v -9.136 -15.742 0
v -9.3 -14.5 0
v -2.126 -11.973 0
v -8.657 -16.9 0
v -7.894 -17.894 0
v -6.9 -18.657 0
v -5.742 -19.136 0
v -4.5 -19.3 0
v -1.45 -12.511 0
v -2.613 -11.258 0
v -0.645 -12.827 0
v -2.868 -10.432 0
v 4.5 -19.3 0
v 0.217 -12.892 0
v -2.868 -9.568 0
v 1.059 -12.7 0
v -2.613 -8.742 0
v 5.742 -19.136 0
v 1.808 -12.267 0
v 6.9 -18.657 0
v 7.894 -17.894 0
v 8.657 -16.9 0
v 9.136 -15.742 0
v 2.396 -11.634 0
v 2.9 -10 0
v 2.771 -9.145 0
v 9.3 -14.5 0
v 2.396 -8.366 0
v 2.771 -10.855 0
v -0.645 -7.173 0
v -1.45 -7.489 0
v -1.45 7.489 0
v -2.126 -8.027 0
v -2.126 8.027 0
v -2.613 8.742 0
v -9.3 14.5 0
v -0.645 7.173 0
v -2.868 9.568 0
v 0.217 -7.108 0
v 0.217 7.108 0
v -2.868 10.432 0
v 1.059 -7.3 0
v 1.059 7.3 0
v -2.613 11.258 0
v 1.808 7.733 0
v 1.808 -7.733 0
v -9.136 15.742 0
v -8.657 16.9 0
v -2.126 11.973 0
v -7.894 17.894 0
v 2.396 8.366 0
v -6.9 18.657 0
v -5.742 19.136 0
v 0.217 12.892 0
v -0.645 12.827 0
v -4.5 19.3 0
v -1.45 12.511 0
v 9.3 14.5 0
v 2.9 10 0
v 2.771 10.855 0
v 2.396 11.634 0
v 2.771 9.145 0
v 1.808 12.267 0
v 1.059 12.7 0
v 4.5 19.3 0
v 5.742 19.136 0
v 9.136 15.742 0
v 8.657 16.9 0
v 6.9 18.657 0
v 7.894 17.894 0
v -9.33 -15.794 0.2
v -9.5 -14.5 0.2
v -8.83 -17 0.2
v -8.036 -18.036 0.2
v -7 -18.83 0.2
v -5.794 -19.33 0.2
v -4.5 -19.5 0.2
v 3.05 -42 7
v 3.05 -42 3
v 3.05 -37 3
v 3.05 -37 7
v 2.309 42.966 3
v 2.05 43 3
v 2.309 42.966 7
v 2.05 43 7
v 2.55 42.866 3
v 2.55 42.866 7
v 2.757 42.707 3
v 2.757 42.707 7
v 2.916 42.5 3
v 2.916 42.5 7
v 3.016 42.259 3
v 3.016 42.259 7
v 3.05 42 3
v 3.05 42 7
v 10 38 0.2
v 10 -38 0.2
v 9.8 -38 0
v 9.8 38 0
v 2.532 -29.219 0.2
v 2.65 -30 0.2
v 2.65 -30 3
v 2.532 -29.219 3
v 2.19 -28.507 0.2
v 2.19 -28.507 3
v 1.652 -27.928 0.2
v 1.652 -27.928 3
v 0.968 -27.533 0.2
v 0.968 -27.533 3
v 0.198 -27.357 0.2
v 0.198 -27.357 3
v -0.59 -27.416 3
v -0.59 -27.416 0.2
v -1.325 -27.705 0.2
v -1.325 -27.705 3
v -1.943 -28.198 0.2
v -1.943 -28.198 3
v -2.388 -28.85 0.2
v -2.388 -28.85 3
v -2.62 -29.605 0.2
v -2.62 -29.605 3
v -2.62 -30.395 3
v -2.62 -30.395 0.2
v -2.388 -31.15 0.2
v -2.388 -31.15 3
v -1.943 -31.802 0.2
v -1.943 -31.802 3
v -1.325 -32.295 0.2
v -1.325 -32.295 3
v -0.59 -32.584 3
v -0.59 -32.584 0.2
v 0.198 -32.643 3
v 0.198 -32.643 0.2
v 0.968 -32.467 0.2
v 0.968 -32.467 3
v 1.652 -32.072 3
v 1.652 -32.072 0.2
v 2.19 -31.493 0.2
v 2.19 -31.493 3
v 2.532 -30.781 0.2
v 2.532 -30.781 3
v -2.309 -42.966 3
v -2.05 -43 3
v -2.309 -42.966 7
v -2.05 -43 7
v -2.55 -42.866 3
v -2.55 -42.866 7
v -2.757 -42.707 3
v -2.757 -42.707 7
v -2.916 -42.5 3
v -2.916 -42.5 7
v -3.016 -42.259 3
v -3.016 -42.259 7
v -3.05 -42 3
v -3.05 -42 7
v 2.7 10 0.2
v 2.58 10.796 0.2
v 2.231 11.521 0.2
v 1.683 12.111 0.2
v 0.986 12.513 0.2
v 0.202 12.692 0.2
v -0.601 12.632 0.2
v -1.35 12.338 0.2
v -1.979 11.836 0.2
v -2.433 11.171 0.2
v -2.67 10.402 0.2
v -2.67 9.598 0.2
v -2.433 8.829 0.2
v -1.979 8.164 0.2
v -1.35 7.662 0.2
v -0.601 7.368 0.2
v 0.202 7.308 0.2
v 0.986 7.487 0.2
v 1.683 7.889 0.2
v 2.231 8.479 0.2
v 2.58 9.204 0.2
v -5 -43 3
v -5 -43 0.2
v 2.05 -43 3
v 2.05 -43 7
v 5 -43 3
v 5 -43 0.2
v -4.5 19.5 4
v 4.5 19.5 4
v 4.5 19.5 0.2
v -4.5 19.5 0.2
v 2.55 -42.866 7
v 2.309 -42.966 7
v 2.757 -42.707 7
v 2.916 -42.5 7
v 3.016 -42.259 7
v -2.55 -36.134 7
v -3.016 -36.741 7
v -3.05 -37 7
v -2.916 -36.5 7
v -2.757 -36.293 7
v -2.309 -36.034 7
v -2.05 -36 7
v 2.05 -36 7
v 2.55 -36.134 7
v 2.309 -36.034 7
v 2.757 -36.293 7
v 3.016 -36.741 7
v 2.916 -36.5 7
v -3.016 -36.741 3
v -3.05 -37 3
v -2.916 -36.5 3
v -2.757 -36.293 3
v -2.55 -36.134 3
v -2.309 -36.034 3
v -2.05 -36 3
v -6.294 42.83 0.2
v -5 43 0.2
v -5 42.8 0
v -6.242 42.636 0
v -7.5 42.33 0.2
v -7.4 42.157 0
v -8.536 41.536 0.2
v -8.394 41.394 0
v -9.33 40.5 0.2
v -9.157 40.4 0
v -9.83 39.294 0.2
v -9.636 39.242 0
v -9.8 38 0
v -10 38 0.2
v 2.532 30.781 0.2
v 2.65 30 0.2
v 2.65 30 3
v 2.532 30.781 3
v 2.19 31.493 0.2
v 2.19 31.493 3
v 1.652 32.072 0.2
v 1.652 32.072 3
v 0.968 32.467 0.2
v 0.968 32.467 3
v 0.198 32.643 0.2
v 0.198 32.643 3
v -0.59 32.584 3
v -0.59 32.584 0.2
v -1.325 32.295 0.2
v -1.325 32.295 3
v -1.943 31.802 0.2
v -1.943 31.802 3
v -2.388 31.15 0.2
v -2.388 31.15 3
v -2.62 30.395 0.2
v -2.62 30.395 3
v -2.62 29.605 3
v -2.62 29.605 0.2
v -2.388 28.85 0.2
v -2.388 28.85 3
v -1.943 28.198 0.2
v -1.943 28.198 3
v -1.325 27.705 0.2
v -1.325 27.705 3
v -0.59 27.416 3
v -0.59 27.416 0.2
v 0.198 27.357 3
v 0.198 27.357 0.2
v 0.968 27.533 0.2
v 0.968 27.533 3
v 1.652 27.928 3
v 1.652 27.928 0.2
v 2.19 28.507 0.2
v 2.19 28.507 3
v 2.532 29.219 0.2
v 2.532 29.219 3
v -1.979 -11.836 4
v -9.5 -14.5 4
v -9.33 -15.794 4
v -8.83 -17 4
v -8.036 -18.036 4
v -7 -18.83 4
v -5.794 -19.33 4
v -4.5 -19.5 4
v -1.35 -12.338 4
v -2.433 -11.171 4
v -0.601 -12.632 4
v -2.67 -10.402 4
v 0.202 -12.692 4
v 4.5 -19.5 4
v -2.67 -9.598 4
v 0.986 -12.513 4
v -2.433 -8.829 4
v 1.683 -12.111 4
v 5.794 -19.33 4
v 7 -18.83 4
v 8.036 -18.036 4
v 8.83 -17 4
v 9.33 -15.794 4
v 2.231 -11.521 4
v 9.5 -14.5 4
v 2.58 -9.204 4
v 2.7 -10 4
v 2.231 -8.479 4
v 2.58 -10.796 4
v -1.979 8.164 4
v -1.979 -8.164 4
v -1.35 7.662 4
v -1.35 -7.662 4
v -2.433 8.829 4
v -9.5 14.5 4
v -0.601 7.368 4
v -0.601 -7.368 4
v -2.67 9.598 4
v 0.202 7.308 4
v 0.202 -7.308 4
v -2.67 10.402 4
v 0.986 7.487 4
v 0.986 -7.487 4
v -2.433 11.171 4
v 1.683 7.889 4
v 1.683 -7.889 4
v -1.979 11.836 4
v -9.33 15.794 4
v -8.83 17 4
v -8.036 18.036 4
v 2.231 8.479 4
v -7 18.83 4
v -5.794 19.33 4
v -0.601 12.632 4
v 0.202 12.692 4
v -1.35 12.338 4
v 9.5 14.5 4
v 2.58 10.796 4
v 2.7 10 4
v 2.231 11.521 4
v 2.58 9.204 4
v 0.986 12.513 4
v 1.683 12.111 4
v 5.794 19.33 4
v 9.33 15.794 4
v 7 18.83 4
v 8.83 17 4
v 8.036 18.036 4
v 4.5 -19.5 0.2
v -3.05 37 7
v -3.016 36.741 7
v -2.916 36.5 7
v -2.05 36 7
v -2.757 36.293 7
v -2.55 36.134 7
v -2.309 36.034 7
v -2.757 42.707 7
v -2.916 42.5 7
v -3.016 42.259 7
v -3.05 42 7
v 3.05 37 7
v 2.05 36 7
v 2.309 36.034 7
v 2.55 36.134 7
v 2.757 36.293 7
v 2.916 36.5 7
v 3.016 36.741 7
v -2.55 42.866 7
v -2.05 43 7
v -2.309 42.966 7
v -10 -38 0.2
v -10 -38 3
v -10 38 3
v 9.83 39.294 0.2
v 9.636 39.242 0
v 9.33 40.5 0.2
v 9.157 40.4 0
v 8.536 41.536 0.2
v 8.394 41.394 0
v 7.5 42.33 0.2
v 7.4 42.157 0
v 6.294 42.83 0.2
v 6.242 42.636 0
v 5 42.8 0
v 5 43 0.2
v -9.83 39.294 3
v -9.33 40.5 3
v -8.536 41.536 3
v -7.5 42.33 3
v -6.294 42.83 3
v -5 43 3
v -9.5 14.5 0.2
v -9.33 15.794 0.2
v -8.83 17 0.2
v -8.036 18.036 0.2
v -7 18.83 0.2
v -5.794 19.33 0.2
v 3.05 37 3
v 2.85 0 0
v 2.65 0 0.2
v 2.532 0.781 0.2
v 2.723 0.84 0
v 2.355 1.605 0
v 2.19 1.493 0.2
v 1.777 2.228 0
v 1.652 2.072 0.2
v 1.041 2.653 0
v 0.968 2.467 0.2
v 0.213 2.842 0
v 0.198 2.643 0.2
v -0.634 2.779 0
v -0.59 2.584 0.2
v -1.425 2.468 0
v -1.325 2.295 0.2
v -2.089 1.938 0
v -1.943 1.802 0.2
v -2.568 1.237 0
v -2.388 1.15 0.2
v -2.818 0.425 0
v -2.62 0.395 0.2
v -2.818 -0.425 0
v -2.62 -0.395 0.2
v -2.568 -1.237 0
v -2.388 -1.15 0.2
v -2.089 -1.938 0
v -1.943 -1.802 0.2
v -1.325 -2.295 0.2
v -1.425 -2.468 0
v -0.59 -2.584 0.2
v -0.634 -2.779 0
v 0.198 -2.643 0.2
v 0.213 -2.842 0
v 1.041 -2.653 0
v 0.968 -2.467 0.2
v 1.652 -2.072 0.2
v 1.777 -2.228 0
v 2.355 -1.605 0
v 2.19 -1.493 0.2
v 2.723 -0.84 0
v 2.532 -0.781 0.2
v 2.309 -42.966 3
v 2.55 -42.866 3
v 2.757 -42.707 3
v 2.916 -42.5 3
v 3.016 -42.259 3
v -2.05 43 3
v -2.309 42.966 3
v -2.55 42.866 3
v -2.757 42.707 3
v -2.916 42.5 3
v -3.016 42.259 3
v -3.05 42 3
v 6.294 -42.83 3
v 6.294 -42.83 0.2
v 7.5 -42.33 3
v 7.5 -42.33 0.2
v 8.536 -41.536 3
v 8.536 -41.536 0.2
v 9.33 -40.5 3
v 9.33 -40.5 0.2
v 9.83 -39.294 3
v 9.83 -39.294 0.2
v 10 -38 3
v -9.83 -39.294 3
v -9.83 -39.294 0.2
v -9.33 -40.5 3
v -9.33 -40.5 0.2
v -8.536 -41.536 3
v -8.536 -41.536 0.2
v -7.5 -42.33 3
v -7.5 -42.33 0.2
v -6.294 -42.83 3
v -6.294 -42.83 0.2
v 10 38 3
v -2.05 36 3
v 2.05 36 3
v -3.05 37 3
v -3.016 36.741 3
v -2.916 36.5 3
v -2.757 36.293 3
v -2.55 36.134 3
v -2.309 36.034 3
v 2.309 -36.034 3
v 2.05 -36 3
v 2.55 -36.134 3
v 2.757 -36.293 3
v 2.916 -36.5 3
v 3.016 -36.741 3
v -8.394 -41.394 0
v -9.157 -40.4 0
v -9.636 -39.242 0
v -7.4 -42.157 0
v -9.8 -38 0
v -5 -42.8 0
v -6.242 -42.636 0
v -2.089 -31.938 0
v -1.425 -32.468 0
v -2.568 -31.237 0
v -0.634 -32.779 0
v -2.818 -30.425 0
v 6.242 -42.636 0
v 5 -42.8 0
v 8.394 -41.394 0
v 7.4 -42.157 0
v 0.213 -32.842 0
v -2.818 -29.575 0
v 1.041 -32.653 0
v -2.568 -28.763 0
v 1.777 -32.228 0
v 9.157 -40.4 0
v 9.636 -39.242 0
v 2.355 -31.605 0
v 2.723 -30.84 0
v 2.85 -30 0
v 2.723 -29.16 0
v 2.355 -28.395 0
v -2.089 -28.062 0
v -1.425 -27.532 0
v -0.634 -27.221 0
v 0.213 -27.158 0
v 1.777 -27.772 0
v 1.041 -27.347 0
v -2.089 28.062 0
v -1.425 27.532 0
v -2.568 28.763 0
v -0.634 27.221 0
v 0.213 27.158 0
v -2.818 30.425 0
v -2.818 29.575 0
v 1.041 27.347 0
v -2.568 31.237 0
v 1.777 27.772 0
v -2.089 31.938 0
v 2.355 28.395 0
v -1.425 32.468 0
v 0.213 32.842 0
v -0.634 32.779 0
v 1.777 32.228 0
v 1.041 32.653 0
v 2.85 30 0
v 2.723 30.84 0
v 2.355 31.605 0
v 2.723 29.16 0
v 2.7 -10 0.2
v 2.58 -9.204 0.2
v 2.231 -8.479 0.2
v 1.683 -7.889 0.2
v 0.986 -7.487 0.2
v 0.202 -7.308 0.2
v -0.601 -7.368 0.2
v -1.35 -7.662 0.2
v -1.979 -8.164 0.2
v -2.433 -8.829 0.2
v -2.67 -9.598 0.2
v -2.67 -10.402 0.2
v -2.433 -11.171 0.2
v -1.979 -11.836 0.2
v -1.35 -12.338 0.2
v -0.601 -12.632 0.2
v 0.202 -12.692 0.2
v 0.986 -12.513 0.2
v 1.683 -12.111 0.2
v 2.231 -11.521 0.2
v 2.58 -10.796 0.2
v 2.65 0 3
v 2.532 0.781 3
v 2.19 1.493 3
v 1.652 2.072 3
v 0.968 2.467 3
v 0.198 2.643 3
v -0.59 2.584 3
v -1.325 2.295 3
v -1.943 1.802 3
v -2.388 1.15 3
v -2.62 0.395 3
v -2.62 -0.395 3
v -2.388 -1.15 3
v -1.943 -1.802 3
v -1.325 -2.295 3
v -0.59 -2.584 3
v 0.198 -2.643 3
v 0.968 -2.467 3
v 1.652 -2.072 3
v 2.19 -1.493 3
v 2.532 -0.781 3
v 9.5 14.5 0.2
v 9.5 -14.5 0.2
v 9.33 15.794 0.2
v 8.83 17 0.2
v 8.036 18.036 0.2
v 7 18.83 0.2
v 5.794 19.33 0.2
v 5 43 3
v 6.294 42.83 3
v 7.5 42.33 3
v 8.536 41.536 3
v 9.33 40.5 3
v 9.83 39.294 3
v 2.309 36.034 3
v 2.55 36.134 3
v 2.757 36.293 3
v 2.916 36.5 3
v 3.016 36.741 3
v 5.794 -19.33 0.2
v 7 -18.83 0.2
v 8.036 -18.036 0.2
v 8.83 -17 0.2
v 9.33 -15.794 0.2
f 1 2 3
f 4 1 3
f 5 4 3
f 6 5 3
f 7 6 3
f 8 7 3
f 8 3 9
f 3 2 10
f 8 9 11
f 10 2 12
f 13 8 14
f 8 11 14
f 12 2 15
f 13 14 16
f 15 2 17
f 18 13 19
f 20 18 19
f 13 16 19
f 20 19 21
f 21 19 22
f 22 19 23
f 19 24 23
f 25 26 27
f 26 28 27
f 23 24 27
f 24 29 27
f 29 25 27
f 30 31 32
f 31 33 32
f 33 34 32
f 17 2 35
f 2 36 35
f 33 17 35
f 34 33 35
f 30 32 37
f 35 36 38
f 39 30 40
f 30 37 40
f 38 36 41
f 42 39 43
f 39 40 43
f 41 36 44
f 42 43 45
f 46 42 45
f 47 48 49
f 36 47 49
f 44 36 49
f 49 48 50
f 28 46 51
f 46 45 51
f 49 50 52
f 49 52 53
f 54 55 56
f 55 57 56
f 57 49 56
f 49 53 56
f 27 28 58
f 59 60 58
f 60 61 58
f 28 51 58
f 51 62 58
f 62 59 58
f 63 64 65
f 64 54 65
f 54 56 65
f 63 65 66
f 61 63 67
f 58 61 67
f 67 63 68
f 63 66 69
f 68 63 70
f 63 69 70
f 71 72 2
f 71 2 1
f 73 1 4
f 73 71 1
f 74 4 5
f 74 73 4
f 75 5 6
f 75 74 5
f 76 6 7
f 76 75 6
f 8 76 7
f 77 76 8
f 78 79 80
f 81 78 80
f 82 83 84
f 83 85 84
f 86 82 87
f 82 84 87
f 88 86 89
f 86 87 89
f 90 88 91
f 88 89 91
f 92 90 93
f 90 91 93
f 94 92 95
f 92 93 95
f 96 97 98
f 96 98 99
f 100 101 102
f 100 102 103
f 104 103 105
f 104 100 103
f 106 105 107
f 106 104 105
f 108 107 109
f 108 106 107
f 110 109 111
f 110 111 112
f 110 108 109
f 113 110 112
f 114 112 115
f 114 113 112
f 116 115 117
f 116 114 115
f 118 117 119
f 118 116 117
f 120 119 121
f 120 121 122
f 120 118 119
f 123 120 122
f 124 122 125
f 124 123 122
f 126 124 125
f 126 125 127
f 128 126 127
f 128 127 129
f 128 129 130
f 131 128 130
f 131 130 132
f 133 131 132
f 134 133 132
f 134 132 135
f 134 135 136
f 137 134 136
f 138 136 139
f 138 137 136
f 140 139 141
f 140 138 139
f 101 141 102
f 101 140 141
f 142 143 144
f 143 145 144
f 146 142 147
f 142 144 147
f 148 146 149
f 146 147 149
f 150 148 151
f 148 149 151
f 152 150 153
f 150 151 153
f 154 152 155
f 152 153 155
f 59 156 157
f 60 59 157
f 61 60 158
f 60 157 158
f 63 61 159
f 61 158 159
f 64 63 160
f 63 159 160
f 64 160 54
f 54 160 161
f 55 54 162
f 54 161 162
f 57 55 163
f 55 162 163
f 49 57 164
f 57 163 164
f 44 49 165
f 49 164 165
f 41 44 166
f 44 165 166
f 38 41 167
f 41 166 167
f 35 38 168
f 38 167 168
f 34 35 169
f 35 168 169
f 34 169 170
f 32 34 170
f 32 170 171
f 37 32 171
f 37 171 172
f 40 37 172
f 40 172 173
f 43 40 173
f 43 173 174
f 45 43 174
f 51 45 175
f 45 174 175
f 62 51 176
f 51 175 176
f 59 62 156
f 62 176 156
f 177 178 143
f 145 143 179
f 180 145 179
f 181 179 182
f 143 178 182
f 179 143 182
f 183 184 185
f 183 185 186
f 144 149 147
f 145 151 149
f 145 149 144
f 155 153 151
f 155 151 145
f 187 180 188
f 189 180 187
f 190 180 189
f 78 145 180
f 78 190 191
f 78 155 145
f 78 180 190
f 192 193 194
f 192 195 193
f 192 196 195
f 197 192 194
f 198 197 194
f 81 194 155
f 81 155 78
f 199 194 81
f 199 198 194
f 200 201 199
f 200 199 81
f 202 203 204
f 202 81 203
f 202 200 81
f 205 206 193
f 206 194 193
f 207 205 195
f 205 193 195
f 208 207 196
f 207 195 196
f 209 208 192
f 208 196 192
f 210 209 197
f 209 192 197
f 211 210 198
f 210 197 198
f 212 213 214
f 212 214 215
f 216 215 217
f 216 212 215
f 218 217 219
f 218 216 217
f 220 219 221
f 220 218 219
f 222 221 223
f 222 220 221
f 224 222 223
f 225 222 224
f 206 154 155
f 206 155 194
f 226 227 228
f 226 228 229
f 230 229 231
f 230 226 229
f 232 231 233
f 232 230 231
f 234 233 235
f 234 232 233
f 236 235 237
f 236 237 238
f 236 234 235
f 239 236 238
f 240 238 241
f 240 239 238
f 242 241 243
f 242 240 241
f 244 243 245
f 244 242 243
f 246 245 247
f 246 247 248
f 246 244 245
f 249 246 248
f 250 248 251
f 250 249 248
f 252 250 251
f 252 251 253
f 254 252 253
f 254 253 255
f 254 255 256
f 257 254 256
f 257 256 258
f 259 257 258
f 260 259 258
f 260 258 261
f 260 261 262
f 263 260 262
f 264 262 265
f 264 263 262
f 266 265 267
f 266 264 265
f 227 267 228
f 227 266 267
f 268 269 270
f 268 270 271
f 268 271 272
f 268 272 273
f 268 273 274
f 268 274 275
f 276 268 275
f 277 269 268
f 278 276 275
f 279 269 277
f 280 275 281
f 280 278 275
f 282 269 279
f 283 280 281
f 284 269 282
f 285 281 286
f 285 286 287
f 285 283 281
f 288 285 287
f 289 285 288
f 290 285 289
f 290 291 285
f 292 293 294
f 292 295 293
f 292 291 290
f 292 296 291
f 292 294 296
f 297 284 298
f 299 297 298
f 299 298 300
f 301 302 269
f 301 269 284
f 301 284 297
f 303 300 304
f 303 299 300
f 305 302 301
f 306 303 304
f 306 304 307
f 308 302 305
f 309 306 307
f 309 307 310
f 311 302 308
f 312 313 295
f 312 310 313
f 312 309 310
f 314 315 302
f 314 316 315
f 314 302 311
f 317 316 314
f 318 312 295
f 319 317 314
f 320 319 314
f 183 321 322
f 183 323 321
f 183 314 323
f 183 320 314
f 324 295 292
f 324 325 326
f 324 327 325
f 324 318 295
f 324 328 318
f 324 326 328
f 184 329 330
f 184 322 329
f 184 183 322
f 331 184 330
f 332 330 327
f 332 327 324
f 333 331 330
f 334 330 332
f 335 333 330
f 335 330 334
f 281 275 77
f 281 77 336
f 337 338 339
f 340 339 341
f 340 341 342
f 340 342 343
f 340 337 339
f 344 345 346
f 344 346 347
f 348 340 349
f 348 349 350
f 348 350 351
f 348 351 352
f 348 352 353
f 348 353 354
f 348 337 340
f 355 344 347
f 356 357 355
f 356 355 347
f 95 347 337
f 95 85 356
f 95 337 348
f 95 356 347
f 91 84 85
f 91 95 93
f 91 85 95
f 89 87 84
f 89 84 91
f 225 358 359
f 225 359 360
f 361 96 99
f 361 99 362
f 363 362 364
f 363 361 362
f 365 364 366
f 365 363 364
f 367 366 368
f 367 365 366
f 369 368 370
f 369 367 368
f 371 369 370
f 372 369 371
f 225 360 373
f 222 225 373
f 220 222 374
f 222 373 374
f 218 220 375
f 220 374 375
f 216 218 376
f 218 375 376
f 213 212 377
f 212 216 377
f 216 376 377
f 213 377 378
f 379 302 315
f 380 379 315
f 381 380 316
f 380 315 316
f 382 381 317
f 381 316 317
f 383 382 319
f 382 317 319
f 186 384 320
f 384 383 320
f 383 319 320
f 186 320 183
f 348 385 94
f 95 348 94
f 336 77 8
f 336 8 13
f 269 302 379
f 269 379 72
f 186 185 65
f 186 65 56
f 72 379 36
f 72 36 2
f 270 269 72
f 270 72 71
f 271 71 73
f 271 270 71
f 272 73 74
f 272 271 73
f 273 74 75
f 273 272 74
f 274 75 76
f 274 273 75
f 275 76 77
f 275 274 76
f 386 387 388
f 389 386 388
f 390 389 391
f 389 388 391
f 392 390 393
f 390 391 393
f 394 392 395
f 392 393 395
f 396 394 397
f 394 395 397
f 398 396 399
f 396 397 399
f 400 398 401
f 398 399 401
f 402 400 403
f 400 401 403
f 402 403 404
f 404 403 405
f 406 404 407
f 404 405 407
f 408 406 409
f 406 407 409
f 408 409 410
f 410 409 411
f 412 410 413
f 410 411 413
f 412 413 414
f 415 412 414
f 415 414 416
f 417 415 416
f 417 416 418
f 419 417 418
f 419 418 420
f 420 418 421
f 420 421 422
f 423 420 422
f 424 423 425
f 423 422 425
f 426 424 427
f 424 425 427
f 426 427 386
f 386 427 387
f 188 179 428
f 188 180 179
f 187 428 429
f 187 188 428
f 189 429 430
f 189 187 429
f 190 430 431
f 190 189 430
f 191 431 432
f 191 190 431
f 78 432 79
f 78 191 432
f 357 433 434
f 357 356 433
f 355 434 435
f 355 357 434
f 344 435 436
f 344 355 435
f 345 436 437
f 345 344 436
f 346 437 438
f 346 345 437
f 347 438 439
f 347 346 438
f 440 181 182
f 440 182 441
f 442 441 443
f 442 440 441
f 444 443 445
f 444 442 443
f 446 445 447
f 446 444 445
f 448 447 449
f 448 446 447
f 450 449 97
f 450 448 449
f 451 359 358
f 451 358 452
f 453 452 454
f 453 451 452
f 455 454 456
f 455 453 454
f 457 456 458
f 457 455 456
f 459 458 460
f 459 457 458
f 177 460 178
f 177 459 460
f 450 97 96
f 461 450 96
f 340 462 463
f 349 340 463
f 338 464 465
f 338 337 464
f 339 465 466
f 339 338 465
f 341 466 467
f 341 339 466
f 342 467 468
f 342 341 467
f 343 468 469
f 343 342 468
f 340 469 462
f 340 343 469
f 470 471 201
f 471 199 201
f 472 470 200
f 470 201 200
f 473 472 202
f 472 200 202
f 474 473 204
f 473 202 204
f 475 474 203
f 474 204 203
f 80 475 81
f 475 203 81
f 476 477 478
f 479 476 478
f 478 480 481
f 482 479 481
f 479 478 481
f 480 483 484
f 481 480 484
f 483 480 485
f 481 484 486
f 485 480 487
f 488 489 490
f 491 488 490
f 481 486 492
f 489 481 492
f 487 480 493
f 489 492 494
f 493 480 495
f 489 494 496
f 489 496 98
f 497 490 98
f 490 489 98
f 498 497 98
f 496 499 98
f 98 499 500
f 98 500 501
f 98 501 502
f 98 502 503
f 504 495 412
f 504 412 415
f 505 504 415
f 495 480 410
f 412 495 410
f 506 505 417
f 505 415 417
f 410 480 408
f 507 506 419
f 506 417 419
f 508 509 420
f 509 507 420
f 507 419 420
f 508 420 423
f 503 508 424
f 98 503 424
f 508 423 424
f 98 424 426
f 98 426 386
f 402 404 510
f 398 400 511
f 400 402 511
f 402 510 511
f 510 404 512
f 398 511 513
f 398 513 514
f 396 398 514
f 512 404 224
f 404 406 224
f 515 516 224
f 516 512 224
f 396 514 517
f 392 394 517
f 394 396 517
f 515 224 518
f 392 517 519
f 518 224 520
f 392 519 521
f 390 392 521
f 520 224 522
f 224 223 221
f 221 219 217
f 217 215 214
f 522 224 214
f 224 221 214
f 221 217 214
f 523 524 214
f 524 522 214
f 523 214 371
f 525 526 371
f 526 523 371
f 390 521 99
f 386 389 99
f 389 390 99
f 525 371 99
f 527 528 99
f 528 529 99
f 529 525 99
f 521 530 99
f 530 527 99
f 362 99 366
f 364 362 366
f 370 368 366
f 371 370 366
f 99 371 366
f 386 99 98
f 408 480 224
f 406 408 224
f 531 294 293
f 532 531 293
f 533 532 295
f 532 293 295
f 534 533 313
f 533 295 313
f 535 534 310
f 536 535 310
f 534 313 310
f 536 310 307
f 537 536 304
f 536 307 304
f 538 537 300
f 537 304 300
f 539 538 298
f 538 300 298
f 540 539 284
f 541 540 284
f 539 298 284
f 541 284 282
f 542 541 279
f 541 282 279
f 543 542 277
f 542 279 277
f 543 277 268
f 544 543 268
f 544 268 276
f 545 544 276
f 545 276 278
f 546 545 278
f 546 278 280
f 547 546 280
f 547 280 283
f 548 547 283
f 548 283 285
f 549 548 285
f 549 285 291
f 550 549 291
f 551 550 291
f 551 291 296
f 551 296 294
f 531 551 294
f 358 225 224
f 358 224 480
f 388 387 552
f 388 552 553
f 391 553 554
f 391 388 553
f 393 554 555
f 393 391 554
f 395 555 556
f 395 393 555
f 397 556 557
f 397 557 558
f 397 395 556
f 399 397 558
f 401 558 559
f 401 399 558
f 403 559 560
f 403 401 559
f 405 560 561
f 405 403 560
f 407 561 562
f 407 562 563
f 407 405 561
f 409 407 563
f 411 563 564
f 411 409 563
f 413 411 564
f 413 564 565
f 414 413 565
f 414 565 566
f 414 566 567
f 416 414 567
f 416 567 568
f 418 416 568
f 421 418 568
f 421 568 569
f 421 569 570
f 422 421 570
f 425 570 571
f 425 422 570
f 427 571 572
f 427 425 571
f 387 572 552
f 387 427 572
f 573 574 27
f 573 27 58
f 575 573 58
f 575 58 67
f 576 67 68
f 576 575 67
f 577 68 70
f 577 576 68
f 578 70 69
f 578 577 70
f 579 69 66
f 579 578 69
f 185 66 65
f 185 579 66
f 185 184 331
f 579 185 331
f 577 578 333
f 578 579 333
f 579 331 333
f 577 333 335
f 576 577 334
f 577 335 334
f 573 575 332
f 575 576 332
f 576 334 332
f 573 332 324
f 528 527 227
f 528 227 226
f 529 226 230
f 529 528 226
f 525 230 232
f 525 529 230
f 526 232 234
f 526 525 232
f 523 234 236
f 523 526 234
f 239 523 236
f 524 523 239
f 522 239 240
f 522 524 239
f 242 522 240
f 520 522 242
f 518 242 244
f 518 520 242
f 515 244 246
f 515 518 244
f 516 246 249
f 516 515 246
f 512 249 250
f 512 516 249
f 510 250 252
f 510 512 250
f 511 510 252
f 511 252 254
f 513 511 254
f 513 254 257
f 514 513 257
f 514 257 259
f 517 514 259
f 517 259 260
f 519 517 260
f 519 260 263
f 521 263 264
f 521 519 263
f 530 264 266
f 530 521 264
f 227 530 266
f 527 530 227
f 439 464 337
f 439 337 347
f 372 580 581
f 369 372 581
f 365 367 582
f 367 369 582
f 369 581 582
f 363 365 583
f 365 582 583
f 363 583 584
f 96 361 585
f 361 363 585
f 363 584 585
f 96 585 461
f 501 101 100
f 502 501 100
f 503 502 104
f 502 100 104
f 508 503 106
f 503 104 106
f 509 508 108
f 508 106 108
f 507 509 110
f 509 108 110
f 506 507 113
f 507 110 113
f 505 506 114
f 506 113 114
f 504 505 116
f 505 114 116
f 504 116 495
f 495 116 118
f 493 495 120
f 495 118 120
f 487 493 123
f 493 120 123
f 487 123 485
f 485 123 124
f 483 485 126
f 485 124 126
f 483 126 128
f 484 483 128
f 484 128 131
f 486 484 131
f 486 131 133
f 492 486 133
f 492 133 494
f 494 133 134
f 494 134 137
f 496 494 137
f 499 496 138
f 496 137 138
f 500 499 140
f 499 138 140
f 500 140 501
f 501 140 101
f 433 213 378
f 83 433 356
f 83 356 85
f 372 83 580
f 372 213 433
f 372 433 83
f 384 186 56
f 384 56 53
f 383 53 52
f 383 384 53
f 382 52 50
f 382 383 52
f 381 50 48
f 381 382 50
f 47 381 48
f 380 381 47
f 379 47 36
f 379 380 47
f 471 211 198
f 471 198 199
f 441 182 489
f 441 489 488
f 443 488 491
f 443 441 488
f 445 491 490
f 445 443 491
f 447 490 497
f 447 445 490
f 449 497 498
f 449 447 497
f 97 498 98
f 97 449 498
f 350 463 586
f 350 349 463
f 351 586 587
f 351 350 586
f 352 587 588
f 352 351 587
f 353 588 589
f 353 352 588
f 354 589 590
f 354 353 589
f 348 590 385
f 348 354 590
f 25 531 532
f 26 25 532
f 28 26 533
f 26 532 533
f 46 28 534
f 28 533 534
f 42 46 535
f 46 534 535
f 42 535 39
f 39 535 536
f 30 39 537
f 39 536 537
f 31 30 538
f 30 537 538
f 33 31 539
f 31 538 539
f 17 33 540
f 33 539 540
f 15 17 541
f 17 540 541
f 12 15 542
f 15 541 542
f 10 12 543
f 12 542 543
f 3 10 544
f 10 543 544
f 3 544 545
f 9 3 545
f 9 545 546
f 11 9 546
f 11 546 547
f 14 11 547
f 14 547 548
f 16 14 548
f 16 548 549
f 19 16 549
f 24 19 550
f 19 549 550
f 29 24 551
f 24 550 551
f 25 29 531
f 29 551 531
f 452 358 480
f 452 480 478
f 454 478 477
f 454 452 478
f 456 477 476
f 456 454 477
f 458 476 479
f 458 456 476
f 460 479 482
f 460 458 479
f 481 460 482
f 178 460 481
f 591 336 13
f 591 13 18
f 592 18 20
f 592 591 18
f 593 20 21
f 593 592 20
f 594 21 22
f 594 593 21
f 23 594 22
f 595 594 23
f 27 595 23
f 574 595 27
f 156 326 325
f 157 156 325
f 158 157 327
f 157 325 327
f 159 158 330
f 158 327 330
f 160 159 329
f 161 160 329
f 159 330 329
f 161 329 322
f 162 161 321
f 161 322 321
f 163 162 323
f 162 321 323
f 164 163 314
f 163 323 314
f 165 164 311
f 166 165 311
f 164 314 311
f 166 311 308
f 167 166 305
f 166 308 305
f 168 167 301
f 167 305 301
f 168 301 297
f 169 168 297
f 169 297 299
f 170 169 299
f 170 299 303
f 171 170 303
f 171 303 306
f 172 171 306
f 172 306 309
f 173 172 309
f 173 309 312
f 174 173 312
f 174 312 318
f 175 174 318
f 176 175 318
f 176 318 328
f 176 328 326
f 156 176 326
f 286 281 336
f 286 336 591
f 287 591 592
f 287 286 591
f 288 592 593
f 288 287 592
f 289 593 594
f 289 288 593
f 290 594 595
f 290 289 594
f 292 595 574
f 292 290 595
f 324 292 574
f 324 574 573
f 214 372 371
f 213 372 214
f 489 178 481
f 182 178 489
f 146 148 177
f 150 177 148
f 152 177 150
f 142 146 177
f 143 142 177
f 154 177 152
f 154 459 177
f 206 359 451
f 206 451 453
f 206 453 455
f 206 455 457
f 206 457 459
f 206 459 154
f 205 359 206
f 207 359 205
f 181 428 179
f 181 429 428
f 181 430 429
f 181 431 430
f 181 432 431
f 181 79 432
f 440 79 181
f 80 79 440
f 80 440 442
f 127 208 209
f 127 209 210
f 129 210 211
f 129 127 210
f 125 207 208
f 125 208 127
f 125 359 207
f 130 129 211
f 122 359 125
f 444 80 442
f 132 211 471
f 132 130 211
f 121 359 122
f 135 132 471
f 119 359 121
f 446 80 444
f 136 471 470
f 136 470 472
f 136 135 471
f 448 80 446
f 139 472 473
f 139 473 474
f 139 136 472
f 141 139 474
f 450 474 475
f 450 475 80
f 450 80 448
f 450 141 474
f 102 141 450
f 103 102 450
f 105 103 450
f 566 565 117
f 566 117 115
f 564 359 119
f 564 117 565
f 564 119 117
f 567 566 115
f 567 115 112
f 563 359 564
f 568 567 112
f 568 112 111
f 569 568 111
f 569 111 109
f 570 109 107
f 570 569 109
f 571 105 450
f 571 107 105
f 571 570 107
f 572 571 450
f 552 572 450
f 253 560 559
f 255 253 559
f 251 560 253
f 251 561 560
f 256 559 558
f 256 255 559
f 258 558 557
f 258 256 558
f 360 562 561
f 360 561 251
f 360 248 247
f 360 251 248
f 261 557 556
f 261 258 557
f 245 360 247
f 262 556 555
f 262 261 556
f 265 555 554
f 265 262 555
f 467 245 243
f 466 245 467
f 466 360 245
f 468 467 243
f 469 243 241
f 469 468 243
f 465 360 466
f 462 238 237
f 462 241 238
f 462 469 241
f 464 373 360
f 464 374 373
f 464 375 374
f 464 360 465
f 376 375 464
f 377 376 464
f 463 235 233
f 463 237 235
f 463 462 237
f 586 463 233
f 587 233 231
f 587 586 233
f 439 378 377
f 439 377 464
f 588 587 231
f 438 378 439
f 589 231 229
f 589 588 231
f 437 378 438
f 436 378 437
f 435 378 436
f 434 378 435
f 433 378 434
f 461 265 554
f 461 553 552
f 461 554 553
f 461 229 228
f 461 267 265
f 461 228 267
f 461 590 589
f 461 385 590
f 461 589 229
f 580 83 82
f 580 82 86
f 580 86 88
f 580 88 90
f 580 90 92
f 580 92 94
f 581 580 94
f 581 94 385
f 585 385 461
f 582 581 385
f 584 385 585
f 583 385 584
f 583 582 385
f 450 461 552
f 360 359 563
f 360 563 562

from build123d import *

# Parameters (mm, degrees)
F0_W       = 19
F0_H       = 39
F0_R       = 2.7
F3_R       = 5
F4_W       = 20
F4_H       = 86
F4_R       = 2.65
F5_DEPTH   = 3
F6_W       = 6.1
F6_H       = 7
F7_DEPTH   = 4
F8_R       = 5
F9_R       = 1
F10_SIZE   = 0.2
F10_2_SIZE = 0.2


with BuildPart() as f2:
    # F2: sweep along a path in F1
    with BuildLine(Plane.XZ) as f2_path:
        Line((0, 0), (0, 4))
    # F0 (on Top) → F2 (sweep)
    with BuildSketch(Plane.XY):
        Rectangle(F0_W, F0_H)
        with Locations((0, -10)):
            Circle(F0_R, mode=Mode.SUBTRACT)
        with Locations((0, 10)):
            Circle(F0_R, mode=Mode.SUBTRACT)
    sweep(path=f2_path.line)

    # F3
    f3_edges = [f2.edges().sort_by_distance(p)[0] for p in [
        (-9.5, -19.5, 2),
        (9.5, -19.5, 2),
        (-9.5, 19.5, 2),
        (9.5, 19.5, 2),
    ]]
    fillet(f3_edges, radius=F3_R)

    # F10
    f10_edges = [f2.edges().sort_by_distance(p)[0] for p in [
        (9.5, 0, 0),
        (8.035534, -18.035534, 0),
        (8.035534, 18.035534, 0),
        (0, -19.5, 0),
        (0, 19.5, 0),
        (-8.035534, -18.035534, 0),
        (-8.035534, 18.035534, 0),
        (-9.5, 0, 0),
        (-2.7, -10, 0),
        (-2.7, 10, 0),
    ]]
    chamfer(f10_edges, length=F10_SIZE)


with BuildPart() as f5:
    # F4 (on Top) → F5 (new body)
    with BuildSketch(Plane.XY):
        Rectangle(F4_W, F4_H)
        with Locations((0, -30)):
            Circle(F4_R, mode=Mode.SUBTRACT)
        Circle(F4_R, mode=Mode.SUBTRACT)
        with Locations((0, 30)):
            Circle(F4_R, mode=Mode.SUBTRACT)
    extrude(amount=F5_DEPTH)

    # F6 (on face) → F7 (join)
    with BuildSketch(Plane.XY.offset(3)):
        with Locations((0, 39.5)):
            Rectangle(F6_W, F6_H)
        with Locations((0, -39.5)):
            Rectangle(F6_W, F6_H)
    extrude(amount=F7_DEPTH)

    # F8
    f8_edges = [f5.edges().sort_by_distance(p)[0] for p in [
        (-10, -43, 1.5),
        (10, -43, 1.5),
        (-10, 43, 1.5),
        (10, 43, 1.5),
    ]]
    fillet(f8_edges, radius=F8_R)

    # F9
    f9_edges = [f5.edges().sort_by_distance(p)[0] for p in [
        (-3.05, -43, 5),
        (3.05, -43, 5),
        (-3.05, -36, 5),
        (3.05, -36, 5),
        (3.05, 43, 5),
        (3.05, 36, 5),
        (-3.05, 36, 5),
        (-3.05, 43, 5),
    ]]
    fillet(f9_edges, radius=F9_R)

    # F10#2
    f10_2_edges = [f5.edges().sort_by_distance(p)[0] for p in [
        (10, 0, 0),
        (8.535534, -41.535534, 0),
        (8.535534, 41.535534, 0),
        (0, -43, 0),
        (0, 43, 0),
        (-8.535534, -41.535534, 0),
        (-8.535534, 41.535534, 0),
        (-10, 0, 0),
        (-2.65, -30, 0),
        (-2.65, 0, 0),
        (-2.65, 30, 0),
    ]]
    chamfer(f10_2_edges, length=F10_2_SIZE)


solid = Compound([f2.part, f5.part])
